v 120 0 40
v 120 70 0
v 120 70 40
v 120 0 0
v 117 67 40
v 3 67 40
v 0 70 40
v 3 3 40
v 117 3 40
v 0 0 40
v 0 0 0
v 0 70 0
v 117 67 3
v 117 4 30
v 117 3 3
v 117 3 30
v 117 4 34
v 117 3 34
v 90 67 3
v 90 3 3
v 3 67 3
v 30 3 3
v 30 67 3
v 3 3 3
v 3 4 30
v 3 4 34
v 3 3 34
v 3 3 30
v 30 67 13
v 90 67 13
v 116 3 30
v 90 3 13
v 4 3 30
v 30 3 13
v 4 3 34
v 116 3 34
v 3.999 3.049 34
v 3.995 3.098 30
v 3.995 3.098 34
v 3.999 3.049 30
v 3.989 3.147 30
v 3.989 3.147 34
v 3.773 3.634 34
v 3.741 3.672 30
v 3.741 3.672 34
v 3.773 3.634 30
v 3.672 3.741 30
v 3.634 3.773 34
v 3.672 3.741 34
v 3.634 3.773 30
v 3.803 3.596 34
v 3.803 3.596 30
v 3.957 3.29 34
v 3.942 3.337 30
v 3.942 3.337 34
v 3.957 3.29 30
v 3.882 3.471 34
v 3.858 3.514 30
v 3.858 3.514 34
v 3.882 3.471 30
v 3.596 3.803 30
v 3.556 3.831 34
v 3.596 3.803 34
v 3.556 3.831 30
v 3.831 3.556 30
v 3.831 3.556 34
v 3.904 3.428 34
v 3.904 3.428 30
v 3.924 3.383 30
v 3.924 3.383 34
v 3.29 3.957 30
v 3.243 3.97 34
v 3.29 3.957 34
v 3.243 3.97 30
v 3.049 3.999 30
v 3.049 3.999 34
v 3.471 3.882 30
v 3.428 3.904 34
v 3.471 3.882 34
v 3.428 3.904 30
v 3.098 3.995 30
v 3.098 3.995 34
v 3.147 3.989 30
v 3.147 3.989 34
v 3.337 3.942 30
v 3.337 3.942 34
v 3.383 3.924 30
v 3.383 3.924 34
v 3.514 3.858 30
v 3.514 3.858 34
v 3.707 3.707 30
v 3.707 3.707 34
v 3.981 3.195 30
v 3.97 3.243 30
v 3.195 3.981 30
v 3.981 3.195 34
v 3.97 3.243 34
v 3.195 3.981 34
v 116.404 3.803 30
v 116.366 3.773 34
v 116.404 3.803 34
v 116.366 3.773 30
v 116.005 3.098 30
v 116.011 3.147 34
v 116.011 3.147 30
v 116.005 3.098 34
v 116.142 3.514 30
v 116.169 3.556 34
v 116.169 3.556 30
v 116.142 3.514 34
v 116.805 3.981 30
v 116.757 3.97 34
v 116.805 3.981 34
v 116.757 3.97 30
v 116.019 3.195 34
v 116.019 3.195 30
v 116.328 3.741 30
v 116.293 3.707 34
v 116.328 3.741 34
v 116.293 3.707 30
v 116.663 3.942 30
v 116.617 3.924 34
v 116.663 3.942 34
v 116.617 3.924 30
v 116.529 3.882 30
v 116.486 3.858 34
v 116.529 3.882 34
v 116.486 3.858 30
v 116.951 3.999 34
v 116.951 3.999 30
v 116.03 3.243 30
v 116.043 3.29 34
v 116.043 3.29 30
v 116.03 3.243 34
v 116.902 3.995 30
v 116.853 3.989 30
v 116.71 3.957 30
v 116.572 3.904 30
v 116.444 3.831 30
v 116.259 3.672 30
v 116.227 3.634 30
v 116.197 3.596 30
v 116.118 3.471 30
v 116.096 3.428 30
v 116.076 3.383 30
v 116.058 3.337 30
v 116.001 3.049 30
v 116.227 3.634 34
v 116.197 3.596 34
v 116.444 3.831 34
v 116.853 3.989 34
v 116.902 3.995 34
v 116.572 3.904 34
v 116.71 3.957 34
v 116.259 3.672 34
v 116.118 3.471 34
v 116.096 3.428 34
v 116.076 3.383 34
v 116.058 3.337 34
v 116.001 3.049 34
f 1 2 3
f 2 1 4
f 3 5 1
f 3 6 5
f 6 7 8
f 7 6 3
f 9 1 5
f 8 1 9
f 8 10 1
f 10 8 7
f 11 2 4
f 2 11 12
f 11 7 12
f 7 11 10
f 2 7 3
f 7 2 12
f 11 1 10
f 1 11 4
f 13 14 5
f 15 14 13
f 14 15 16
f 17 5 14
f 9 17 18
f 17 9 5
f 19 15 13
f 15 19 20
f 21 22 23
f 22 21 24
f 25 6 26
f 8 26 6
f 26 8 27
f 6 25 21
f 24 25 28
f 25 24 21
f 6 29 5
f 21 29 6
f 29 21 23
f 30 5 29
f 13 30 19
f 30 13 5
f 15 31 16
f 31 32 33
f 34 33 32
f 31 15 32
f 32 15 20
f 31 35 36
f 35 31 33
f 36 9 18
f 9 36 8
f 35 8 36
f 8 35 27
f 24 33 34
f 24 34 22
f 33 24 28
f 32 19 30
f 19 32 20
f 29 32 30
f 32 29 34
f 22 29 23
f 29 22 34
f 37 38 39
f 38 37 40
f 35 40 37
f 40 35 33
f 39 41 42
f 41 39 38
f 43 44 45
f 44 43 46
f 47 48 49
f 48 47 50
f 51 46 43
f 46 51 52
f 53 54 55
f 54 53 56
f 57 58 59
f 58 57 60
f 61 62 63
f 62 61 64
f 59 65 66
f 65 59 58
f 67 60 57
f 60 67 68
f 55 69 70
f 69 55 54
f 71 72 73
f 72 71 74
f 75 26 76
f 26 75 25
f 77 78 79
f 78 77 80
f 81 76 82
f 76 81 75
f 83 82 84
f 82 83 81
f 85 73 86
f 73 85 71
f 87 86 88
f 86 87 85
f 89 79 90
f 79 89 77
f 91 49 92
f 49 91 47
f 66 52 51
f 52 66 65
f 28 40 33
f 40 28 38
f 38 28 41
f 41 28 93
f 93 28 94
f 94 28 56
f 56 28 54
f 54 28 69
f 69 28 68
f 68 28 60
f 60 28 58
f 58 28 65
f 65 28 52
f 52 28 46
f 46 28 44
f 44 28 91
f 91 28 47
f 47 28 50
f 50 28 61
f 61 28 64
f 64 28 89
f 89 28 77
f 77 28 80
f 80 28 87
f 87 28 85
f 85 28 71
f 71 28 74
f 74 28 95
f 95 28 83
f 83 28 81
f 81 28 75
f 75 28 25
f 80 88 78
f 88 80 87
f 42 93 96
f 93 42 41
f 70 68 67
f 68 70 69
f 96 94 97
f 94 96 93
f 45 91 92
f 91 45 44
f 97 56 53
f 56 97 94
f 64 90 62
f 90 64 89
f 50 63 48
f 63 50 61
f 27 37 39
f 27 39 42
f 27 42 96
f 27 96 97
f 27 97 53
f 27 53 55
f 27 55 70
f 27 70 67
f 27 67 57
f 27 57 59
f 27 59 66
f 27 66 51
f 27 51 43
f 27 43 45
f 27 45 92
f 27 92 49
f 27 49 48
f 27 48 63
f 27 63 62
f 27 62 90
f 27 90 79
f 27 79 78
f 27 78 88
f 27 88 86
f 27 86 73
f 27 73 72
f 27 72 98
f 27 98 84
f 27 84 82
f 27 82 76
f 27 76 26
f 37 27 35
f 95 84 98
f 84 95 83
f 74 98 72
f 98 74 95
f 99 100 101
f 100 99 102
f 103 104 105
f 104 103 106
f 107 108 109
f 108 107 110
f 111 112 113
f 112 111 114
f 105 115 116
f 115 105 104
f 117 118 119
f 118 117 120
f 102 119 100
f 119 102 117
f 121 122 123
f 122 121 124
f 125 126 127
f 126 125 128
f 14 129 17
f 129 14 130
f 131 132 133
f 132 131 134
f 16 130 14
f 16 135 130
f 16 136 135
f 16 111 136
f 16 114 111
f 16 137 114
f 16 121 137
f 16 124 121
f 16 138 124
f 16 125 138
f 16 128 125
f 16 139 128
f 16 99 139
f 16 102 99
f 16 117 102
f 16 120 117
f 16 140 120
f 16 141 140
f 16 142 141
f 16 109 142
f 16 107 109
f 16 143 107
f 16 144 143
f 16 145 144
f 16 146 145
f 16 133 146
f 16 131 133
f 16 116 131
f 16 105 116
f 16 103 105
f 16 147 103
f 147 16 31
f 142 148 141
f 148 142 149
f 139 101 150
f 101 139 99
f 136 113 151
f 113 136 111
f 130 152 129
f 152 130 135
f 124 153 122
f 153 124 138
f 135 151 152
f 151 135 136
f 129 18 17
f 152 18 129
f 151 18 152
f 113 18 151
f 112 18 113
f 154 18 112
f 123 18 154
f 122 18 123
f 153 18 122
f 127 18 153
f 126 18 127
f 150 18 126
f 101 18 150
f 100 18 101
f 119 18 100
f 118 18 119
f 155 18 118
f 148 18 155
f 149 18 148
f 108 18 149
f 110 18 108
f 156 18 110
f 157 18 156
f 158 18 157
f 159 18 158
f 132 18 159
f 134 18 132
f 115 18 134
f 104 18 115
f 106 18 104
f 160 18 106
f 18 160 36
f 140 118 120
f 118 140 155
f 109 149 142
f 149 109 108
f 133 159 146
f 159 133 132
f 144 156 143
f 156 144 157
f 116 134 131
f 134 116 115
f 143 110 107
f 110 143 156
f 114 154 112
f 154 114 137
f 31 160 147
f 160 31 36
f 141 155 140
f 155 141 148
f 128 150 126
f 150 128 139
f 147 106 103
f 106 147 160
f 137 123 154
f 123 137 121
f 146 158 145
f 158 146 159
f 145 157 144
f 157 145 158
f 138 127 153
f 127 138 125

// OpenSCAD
// Buffer Tank for Mini Horizontal Gel Electrophoresis
// Dimensions in millimetres

// Outer Dimensions
$w_outer = 120; // Width (X)
$d_outer = 70;  // Depth (Y)
$h_outer = 40;  // Height (Z)

// Wall and Floor Thickness
$w_thick = 3;   // Wall thickness
$f_thick = 3;   // Floor thickness

// Platform Dimensions
$p_len = 60;    // Platform length (X)
$p_height = 10; // Platform height above inner floor

// Hole Dimensions
$h_dia = 2;     // Hole diameter
$h_y = 0;       // Hole Y position
$h_z = 30;      // Hole Z position

// Configuration
$fn = 128;      // Facets for smooth curves

// Derived Dimensions
$w_inner = $w_outer - 2*$w_thick;
$d_inner = $d_outer - 2*$w_thick;
$h_inner = $h_outer - $f_thick;

// Calculate Platform Width (spans full inner width)
$p_width = $d_inner;

// Main Tank Body (Hollow Box)
// Constructed as a solid block with a void subtracted
translate([0, 0, 0])
difference() {
    // Outer Solid Block
    cube([
        $w_outer, 
        $d_outer, 
        $h_outer
    ], center = false);
    
    // Inner Void (The empty space for buffer)
    // Starts at z = floor thickness
    translate([
        $w_thick, 
        $w_thick, 
        $f_thick
    ])
    cube([
        $w_inner, 
        $d_inner, 
        $h_inner
    ], center = false);
}

// Raised Platform
// Positioned in the middle of the tank, spanning full inner width
// It sits on the floor (z = f_thick) and extends up to z = f_thick + p_height
translate([
    ($w_outer - $p_len) / 2, // Center X
    $w_thick,               // Start at inner wall Y
    $f_thick                // Bottom at floor level
])
cube([
    $p_len, 
    $p_width, 
    $p_height
], center = false);

// Electrode Holes
// Drilled through the end walls at y=0, z=30 along X axis
// We need to cut a cylinder through the solid walls at the ends.
// The tank ends are at x = 0 and x = $w_outer.
// The hole is at y=0 (inner surface of the side wall? or center?).
// "through each end wall... at y = 0". Since the tank is 70mm deep and walls are 3mm,
// y=0 is the inner surface of the front wall.
// The hole runs along X.
// We will cut cylinders centered at the ends of the tank.

// Left End Hole
translate([
    $w_thick, // Center X on the left wall face
    $w_thick, // Center Y on the inner face (y=0 relative to outer, but we are at x=$w_thick)
    $h_z      // Center Z
])
difference() {
    // Cut a cylinder through the left wall
    cylinder(
        h = $w_thick + 1, // Extend slightly past the wall thickness
        r = $h_dia / 2,
        $fn = $fn
    );
}

// Right End Hole
translate([
    $w_outer - $w_thick, // Center X on the right wall face
    $w_thick, // Center Y on the inner face
    $h_z      // Center Z
])
difference() {
    // Cut a cylinder through the right wall
    cylinder(
        h = $w_thick + 1, // Extend slightly past the wall thickness
        r = $h_dia / 2,
        $fn = $fn
    );
}
